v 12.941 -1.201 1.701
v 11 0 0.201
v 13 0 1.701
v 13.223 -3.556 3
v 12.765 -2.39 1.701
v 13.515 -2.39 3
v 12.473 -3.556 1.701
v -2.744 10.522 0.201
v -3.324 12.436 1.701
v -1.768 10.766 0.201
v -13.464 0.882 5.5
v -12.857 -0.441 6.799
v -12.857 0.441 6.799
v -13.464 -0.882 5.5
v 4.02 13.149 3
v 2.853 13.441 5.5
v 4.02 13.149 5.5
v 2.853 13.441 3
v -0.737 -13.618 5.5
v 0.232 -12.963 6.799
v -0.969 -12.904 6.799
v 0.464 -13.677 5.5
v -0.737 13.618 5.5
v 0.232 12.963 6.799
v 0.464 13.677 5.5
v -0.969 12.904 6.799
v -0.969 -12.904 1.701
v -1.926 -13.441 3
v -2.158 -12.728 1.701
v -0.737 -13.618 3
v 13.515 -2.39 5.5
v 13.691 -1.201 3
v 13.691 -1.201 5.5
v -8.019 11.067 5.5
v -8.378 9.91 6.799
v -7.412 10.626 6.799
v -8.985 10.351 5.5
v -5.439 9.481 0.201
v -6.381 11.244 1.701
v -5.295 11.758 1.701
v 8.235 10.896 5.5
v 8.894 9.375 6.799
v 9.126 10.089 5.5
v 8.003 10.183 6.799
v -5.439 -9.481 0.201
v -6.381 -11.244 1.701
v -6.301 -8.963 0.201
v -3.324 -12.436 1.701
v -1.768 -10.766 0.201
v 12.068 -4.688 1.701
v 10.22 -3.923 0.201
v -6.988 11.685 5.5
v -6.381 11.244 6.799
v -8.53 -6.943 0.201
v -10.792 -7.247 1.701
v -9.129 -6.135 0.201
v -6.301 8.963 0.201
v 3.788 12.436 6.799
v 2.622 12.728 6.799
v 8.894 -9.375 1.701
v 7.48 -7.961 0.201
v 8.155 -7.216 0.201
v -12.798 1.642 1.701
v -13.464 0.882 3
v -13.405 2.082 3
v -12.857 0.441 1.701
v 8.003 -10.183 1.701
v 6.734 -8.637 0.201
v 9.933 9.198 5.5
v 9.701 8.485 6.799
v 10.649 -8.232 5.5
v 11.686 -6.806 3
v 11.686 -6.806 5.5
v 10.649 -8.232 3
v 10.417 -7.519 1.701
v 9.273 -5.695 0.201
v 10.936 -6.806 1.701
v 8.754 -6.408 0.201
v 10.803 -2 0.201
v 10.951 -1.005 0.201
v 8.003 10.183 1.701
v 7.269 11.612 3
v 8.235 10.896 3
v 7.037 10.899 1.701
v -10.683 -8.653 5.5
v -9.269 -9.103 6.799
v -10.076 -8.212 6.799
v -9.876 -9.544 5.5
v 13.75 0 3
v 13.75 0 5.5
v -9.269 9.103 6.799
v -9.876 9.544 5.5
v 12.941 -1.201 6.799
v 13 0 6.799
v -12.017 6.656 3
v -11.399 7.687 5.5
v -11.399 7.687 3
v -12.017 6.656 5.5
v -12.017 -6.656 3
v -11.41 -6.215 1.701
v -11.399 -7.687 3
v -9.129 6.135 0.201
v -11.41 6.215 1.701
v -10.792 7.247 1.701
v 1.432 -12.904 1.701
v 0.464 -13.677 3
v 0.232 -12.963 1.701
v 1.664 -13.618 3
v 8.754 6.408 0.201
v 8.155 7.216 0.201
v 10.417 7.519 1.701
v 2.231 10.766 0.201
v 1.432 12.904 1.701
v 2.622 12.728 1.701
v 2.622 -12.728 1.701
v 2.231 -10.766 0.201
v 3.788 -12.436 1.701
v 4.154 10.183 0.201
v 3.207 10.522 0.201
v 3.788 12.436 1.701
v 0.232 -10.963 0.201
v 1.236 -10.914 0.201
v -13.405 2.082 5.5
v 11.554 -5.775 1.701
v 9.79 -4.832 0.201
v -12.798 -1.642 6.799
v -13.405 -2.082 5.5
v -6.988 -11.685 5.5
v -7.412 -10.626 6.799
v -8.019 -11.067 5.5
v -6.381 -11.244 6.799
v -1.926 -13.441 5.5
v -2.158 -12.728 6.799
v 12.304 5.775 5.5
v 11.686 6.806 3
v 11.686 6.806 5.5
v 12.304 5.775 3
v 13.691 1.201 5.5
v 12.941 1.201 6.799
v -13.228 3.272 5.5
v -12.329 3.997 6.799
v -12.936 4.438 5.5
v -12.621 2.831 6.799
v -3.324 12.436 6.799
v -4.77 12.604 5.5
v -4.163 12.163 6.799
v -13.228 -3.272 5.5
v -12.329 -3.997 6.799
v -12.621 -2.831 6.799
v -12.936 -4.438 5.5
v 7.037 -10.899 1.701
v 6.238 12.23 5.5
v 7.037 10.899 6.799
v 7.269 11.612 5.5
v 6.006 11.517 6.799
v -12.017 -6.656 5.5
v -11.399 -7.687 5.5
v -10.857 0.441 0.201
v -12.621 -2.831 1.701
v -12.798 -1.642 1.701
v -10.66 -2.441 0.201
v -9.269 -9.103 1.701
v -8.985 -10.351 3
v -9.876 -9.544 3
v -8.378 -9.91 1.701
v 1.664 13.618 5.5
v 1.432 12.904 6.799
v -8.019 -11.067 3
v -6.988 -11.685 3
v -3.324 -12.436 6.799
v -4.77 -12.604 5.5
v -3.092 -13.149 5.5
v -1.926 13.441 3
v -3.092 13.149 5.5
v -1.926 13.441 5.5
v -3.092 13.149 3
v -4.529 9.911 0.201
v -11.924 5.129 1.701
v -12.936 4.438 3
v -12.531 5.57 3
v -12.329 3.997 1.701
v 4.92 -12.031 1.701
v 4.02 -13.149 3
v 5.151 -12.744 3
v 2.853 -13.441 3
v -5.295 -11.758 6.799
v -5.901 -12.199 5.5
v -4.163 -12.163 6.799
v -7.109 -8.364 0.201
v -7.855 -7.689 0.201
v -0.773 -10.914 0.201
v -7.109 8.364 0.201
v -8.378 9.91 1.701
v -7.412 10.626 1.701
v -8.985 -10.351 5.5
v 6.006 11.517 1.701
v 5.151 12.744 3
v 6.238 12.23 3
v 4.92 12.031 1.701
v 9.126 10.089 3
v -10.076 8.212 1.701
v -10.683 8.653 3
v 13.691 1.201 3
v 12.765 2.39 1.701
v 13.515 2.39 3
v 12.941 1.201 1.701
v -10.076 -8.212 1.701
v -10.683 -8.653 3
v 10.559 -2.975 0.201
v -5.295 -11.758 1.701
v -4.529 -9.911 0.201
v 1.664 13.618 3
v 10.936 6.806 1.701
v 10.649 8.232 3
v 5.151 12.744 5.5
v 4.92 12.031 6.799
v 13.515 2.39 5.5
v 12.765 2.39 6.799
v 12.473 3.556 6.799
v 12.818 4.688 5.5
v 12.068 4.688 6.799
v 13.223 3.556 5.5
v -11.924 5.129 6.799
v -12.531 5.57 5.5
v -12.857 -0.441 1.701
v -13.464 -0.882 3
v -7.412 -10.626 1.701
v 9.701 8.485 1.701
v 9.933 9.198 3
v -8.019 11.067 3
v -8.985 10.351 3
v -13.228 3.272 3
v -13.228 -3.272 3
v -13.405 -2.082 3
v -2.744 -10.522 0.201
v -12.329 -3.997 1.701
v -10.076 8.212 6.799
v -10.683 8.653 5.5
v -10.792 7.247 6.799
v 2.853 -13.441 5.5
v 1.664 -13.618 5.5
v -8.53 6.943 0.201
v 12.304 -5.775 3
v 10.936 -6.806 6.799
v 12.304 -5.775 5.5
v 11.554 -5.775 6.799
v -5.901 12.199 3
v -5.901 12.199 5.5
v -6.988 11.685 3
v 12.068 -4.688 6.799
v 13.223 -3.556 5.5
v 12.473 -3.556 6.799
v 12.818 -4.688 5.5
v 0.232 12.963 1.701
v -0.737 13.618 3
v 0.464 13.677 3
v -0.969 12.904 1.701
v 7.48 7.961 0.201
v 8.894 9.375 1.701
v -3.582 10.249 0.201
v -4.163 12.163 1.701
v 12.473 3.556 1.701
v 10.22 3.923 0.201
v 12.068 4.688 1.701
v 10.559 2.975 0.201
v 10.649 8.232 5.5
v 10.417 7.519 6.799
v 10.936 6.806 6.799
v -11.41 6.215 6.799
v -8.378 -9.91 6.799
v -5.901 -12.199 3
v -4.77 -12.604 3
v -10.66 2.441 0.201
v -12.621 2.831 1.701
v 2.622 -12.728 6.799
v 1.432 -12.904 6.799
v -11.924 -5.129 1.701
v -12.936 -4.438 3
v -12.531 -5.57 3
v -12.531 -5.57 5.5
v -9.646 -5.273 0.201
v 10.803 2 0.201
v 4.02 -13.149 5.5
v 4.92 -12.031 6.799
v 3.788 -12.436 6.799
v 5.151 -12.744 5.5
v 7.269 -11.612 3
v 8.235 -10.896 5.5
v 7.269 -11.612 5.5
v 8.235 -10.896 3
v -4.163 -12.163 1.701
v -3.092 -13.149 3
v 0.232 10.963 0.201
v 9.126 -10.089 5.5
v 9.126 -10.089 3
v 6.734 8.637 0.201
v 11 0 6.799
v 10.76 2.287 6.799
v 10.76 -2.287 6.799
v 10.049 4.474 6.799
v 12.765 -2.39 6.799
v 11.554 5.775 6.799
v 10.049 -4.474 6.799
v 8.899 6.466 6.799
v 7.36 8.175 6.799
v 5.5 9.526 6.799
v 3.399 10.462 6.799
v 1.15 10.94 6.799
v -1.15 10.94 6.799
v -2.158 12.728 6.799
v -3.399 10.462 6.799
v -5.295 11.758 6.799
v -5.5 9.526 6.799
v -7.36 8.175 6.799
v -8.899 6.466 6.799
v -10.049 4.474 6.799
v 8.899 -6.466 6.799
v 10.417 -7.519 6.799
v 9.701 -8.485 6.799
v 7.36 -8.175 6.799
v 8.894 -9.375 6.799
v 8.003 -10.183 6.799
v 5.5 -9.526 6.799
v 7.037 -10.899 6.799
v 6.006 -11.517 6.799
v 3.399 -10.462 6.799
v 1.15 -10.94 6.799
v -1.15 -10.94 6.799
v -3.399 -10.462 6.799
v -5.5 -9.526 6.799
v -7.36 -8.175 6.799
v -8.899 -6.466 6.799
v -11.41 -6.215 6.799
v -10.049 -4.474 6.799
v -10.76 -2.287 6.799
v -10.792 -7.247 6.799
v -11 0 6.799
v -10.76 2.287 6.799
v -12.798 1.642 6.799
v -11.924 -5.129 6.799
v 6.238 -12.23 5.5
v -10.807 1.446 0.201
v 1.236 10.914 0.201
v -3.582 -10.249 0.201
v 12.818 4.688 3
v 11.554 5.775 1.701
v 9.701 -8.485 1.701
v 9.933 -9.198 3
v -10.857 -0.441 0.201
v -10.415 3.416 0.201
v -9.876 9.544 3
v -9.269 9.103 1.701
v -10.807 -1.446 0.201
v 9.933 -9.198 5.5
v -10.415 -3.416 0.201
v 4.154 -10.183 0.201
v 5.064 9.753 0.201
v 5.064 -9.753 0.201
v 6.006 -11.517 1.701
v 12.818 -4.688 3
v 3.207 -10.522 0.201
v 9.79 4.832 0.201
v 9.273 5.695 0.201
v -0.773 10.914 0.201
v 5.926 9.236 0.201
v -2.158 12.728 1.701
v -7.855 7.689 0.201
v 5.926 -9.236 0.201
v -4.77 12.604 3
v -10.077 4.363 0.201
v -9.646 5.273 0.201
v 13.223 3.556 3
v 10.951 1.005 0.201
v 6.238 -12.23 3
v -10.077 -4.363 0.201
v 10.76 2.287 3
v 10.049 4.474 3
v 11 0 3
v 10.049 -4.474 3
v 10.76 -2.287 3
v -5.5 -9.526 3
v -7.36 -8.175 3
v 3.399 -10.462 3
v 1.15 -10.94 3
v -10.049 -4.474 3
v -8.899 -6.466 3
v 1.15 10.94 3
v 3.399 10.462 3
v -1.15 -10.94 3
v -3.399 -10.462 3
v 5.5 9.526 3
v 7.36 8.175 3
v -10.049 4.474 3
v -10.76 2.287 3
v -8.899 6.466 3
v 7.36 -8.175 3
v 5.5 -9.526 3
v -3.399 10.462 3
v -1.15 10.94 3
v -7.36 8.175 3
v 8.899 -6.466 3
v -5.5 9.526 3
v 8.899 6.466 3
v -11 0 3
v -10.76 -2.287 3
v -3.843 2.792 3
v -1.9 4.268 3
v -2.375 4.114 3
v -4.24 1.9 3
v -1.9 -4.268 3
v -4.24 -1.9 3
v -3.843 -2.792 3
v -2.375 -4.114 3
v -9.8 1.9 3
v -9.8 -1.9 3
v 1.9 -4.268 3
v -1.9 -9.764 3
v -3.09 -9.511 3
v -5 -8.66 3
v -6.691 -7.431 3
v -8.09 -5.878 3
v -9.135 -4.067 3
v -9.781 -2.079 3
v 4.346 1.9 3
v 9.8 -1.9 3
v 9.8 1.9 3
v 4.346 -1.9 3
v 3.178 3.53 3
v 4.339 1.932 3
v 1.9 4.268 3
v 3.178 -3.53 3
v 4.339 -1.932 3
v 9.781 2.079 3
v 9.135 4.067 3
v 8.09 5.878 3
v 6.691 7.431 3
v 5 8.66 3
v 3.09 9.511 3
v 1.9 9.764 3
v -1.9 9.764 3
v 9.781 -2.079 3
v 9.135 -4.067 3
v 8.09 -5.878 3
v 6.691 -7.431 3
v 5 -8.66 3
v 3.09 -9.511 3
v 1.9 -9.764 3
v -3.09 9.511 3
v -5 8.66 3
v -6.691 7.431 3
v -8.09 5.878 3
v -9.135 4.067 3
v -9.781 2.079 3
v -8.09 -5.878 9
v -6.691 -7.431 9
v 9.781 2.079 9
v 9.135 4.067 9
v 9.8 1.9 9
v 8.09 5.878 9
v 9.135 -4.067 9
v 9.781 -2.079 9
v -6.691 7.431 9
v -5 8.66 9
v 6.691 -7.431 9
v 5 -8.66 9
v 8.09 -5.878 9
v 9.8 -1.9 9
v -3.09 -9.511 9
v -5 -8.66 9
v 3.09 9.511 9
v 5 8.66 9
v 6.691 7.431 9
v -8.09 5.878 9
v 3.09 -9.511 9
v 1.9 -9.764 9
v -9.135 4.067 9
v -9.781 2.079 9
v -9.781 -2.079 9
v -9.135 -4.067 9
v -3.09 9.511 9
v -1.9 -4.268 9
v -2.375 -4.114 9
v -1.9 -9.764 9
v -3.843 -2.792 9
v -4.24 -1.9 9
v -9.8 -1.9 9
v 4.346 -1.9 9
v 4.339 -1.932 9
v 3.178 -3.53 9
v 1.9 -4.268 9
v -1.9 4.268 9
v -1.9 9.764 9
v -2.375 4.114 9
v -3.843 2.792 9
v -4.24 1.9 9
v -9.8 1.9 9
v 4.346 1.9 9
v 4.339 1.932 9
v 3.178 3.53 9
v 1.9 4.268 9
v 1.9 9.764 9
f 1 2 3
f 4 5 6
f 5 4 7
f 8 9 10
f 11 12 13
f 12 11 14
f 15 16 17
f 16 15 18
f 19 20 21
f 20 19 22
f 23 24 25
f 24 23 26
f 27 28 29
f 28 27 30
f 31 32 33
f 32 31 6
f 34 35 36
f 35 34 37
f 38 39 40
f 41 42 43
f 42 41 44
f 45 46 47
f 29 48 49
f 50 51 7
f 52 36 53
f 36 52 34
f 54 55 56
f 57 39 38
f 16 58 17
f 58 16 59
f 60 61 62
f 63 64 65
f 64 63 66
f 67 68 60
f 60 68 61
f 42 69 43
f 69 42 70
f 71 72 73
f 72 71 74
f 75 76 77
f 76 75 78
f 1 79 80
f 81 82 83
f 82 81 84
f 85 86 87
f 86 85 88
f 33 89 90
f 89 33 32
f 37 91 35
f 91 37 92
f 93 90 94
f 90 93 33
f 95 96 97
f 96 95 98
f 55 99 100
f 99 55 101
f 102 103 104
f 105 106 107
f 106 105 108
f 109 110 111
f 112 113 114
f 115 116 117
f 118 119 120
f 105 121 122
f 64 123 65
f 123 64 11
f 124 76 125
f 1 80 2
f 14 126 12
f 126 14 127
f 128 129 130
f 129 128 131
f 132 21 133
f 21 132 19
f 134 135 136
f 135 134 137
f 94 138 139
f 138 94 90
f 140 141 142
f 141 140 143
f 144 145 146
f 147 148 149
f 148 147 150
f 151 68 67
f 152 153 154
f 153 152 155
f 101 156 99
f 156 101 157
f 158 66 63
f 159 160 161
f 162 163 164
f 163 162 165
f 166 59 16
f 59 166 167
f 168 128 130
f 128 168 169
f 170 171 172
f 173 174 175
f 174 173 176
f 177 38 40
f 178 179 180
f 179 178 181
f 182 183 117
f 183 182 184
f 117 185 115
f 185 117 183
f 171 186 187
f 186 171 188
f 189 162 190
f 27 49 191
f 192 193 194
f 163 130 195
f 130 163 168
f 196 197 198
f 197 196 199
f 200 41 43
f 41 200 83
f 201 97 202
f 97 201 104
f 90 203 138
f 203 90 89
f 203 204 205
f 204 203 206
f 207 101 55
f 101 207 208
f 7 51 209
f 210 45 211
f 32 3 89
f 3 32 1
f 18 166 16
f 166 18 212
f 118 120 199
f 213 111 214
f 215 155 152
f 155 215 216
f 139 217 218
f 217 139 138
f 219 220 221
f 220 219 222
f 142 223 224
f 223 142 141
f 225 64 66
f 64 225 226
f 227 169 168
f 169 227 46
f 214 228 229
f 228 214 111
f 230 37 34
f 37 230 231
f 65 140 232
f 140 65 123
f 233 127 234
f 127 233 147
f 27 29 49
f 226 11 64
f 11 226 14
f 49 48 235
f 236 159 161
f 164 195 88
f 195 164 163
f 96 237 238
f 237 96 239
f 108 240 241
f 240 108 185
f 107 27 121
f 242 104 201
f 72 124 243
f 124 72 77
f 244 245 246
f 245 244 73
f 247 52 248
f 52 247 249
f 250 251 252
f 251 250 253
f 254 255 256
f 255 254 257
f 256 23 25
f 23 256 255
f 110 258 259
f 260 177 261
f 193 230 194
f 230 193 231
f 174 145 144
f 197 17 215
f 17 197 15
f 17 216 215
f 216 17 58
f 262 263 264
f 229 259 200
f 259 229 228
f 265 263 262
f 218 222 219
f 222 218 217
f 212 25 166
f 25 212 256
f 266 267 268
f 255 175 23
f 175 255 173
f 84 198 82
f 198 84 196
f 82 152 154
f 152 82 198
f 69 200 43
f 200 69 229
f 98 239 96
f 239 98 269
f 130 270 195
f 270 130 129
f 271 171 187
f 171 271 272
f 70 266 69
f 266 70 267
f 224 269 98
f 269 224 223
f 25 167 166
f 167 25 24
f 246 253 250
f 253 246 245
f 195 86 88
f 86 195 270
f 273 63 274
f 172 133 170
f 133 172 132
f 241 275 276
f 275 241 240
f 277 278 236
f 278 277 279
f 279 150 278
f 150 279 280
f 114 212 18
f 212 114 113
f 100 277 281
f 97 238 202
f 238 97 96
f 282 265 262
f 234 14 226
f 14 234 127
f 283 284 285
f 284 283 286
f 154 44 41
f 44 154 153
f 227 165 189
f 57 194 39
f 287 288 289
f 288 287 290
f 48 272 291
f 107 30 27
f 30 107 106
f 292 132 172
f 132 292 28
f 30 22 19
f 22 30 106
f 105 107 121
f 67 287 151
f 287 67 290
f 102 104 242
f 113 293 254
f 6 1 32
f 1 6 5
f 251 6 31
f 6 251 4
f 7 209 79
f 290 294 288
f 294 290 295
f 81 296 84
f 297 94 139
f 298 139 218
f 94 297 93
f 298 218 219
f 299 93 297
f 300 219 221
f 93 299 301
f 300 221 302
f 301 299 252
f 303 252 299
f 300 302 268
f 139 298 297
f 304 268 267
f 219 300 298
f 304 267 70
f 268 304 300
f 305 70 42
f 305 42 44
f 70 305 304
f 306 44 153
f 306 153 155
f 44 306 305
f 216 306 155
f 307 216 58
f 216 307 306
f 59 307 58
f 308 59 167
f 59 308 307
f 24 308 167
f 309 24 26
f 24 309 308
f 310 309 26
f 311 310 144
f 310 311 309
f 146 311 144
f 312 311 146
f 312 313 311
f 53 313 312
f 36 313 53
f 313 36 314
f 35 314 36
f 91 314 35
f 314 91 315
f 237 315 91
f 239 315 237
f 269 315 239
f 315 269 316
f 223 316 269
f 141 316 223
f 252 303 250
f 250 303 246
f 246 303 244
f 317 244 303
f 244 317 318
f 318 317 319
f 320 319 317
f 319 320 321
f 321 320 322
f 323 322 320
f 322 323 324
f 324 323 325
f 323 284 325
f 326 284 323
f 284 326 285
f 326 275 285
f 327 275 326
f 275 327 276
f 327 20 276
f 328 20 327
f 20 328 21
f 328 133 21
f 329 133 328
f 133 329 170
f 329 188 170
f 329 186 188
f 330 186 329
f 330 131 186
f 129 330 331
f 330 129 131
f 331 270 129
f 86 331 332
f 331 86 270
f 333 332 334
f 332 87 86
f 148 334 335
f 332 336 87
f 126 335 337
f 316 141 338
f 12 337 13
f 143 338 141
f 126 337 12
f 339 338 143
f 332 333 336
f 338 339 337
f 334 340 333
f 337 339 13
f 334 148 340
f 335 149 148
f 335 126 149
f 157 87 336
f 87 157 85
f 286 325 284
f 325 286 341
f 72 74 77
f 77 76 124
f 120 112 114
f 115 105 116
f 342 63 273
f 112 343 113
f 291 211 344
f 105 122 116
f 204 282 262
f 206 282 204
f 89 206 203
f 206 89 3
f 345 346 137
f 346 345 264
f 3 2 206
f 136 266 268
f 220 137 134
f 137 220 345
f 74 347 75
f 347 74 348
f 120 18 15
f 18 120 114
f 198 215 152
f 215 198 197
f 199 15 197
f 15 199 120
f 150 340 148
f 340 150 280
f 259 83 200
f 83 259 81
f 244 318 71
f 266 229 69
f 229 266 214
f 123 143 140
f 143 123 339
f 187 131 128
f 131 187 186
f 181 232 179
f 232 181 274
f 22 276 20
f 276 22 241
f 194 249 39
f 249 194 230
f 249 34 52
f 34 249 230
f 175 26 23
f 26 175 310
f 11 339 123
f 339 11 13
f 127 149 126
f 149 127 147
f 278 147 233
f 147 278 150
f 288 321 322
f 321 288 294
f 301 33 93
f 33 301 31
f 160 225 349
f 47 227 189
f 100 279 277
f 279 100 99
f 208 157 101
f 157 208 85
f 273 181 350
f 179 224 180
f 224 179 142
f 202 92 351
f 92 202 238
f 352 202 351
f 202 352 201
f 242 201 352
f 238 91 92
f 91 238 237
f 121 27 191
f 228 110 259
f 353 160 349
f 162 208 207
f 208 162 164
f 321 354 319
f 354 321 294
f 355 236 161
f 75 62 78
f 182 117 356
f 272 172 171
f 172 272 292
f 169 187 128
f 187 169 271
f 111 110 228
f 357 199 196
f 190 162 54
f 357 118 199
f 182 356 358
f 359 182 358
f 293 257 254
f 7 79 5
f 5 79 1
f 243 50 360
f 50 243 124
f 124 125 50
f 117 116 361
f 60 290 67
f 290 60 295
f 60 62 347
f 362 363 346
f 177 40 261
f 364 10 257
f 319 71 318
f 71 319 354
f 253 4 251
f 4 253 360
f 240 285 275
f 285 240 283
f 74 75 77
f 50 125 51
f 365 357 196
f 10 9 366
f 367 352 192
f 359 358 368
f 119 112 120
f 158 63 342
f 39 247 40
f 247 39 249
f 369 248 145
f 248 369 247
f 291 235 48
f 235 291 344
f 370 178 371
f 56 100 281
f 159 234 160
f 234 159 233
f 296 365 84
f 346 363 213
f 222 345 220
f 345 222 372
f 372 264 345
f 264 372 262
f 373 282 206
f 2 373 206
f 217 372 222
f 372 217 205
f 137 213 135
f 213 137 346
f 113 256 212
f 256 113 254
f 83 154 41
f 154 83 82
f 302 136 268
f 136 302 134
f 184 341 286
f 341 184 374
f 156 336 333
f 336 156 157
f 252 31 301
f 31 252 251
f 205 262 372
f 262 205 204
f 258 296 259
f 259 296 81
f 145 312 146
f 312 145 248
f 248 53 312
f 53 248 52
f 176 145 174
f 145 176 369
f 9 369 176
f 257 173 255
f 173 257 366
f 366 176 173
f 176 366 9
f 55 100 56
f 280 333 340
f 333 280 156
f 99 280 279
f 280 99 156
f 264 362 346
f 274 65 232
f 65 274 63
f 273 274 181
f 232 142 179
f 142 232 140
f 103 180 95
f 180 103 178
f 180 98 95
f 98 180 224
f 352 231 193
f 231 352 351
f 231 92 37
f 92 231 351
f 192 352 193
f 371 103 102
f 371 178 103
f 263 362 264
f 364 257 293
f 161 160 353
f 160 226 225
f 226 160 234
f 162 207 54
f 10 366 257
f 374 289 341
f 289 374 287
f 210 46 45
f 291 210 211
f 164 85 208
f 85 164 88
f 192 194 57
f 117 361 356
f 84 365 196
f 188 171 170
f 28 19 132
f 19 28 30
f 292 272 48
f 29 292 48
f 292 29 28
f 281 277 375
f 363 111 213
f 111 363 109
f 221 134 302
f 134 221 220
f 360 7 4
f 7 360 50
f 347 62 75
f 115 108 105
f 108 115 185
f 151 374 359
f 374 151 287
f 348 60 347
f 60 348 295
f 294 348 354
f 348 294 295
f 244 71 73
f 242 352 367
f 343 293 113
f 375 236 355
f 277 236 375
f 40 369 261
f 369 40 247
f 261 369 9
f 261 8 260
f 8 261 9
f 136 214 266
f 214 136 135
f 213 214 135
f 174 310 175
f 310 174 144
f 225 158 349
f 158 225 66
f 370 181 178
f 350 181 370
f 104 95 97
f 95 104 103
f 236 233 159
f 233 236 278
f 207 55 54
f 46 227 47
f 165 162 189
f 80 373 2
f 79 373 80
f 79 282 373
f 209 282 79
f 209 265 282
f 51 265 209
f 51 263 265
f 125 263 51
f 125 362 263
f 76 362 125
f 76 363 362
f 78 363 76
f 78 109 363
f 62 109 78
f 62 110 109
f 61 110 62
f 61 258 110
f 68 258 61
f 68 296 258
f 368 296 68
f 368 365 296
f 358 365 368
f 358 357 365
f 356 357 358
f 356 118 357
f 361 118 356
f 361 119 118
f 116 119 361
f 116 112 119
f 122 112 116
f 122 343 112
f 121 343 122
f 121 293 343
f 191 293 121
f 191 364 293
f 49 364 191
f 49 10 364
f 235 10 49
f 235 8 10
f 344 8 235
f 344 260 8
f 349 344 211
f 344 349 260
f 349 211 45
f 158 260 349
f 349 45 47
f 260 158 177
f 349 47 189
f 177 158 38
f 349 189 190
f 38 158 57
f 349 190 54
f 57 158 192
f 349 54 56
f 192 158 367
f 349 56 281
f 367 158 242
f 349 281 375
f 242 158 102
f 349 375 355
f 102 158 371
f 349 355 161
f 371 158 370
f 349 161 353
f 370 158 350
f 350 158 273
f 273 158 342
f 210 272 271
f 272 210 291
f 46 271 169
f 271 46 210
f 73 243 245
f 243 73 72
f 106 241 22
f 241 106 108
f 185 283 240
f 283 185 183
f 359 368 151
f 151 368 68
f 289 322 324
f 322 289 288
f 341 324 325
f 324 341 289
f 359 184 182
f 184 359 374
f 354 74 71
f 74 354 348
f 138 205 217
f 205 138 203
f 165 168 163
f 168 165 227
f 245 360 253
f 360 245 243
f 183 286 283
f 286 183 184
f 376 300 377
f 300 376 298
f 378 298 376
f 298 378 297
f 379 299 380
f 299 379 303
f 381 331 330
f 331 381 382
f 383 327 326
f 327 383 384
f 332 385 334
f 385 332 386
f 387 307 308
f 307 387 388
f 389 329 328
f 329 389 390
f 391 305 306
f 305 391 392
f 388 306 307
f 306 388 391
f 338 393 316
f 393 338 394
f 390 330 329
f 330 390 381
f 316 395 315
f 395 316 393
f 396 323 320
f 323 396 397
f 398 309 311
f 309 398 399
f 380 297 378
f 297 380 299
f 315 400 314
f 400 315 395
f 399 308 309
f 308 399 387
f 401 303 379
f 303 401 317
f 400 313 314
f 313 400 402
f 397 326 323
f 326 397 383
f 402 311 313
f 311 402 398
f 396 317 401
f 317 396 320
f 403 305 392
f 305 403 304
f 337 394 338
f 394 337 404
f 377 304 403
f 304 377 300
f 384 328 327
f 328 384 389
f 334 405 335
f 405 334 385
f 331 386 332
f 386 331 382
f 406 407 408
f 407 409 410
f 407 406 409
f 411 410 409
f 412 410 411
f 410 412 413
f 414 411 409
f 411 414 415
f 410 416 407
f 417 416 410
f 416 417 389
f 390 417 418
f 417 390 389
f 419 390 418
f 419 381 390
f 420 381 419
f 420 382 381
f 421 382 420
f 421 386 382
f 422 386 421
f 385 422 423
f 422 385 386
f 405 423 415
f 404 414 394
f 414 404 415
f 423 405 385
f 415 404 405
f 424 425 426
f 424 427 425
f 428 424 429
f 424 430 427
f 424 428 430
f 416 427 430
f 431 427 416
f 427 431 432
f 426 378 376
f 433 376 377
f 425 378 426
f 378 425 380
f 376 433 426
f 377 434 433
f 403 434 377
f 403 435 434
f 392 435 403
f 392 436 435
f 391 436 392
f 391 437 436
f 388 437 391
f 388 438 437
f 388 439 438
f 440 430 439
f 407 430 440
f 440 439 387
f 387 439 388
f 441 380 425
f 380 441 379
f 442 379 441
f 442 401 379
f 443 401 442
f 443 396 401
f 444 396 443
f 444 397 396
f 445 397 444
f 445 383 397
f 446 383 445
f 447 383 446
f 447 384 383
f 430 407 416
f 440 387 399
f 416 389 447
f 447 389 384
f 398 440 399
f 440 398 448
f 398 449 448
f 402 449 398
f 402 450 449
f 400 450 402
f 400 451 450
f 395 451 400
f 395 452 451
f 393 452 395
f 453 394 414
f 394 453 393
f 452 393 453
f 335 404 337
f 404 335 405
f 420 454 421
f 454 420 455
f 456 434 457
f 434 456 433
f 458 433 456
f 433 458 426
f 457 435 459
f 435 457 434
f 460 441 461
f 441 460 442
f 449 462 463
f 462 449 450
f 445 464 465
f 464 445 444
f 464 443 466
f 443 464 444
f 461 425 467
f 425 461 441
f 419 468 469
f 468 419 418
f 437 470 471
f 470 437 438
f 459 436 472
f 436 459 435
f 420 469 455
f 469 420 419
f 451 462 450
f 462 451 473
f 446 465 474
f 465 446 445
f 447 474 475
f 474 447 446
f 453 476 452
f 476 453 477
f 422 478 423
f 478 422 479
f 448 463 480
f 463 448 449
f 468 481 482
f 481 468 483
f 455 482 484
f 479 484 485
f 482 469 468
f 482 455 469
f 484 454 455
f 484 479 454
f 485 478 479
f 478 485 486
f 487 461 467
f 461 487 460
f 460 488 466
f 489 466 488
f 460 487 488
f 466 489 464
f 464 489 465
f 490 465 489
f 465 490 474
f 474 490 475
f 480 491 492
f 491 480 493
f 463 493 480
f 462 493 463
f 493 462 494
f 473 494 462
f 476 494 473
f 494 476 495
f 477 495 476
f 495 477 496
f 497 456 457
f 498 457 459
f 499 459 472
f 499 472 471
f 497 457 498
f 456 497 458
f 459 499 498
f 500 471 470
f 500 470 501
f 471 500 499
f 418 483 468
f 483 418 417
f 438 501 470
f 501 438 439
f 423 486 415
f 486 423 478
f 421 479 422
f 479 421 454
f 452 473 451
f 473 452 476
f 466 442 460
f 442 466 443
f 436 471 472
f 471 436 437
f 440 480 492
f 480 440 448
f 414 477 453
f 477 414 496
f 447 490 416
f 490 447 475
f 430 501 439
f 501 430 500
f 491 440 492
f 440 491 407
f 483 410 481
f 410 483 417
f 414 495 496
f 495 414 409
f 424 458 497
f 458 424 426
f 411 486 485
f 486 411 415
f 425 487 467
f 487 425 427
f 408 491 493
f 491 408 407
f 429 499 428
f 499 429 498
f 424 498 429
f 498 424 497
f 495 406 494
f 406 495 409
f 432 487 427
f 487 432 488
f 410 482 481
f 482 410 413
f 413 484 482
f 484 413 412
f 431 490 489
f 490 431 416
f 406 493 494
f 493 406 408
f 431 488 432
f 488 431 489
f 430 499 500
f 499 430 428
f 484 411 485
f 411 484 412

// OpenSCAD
d=22;
t=1.5;
brim=2;
brim_h=4;
shape_fn=64;
smooth_sphere=3;
plug_top=brim*1.5;
plug_h=6;
plug_w=d-2*t;
plug_tight=1;
plug_hole_d=plug_w*0.5;

slot_w=plug_w*0.2;
INF=999;
cap_d=d+2*brim;

difference () {
    minkowski() { 
        diff=smooth_sphere/2;
        translate([0,0,diff]) hull() {
            cylinder(h = plug_top, d1=d-diff, d2=cap_d-diff, $fn=shape_fn);
            translate([0,0,plug_top-diff]) cylinder(h=brim_h-diff, d=cap_d-diff, $fn=shape_fn);
        }
        sphere(d=smooth_sphere);
    }

        translate([0,0,plug_top]) cylinder(h=INF, d=d);
}

module slot(w) cube([w, INF, INF], center=true);
// plug
difference () {
	translate([0,0,plug_top]) cylinder(h=plug_h, d=plug_w+plug_tight);
	slot(slot_w);
	rotate(90) slot(slot_w);
	cylinder(h=INF, d=plug_hole_d);
}
